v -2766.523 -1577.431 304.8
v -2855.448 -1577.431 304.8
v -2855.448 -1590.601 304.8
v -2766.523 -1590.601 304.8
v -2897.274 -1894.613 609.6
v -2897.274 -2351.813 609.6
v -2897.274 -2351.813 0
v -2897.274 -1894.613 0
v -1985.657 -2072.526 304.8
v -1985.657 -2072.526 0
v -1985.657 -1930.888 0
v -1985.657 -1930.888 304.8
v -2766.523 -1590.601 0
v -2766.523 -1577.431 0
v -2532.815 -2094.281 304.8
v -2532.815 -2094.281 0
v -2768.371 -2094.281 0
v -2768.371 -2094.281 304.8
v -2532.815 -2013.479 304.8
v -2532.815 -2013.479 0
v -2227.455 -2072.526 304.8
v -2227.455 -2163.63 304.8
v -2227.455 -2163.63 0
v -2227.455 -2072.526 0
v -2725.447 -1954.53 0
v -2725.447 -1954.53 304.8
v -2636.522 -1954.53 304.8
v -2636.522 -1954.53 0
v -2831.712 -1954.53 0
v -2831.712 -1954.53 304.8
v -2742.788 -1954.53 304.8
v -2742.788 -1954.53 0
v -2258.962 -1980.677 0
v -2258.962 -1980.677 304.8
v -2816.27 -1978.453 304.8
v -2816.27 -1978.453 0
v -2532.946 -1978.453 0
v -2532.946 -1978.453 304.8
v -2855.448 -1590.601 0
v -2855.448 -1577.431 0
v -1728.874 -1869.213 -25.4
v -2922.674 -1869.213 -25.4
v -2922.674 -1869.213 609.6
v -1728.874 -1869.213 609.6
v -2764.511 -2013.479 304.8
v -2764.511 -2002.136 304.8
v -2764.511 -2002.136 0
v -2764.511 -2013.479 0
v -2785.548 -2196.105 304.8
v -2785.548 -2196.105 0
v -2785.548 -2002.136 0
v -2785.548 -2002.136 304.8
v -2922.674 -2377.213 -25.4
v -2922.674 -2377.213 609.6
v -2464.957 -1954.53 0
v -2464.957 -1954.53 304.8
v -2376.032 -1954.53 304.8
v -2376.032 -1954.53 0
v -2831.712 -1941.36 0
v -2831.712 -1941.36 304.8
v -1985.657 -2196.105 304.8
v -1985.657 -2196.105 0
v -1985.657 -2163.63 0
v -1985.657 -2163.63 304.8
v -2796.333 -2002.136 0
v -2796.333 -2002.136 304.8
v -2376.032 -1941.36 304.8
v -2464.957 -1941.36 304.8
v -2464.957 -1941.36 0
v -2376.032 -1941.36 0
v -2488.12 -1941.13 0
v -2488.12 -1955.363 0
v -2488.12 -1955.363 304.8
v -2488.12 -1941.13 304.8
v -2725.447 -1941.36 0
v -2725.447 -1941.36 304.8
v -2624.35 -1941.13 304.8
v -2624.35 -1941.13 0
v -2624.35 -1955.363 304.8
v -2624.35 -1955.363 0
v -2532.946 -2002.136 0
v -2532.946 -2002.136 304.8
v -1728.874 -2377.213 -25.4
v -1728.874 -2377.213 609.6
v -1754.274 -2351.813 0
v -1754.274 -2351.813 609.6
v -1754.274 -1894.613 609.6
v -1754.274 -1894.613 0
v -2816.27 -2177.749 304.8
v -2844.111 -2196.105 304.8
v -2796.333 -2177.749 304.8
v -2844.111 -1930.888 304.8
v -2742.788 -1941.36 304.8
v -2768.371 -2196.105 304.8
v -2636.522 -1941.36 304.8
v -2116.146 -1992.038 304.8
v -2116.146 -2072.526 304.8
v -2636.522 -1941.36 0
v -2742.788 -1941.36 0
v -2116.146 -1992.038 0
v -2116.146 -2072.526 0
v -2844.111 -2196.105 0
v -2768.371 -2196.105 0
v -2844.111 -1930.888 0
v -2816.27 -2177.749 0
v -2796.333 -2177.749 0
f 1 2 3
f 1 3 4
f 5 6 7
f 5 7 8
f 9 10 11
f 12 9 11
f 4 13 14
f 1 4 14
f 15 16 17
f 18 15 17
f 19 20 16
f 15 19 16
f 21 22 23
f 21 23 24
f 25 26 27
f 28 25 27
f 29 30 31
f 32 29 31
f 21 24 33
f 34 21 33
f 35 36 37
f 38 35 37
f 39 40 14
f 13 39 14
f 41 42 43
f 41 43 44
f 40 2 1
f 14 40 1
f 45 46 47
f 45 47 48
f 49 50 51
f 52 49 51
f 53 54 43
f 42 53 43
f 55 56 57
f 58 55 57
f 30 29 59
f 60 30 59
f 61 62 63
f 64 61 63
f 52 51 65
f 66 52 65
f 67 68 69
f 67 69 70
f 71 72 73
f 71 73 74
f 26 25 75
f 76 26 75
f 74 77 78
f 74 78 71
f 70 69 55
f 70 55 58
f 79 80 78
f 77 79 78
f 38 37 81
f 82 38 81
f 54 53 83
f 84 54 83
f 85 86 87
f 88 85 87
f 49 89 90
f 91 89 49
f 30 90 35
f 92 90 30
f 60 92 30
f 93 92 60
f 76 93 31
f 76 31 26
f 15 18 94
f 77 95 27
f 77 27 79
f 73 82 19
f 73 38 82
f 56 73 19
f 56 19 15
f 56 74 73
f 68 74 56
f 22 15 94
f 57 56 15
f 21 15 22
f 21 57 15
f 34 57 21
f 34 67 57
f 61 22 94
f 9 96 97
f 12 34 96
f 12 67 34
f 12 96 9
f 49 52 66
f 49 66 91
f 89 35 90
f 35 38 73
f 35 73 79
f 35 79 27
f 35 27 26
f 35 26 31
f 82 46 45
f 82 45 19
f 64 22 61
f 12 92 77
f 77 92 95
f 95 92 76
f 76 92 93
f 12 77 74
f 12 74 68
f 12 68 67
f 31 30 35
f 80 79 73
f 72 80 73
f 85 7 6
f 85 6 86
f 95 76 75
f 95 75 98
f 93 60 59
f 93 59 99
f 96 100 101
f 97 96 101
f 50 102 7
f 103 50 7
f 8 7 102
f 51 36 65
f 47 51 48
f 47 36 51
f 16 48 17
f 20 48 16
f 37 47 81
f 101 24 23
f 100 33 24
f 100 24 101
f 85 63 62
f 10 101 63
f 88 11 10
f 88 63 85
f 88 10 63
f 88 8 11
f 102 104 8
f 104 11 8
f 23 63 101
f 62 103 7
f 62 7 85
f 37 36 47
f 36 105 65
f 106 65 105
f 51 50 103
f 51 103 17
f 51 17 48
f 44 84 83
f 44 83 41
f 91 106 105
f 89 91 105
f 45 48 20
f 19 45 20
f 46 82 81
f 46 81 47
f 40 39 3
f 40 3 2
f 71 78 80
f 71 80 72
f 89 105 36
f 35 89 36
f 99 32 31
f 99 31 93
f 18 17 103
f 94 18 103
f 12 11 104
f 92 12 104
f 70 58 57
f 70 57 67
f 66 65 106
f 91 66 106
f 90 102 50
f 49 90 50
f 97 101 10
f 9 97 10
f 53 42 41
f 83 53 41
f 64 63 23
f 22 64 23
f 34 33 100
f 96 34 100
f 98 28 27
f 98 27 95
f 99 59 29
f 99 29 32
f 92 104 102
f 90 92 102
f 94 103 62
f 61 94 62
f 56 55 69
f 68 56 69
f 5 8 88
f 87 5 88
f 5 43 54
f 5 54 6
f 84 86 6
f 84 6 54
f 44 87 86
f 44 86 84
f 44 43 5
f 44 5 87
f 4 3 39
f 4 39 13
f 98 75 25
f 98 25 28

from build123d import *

# Parameters (mm, degrees)
F0_W     = 1143
F0_H     = 457.2
F1_DEPTH = 609.6
F2_T     = 25.4
F3_W     = 88.9248847961
F3_H     = 13.1702423096
F3_W_2   = 136.2295150757
F3_H_2   = 14.2334699631
F4_DEPTH = 304.8


with BuildPart() as f1:
    # F0 (on Top) → F1 (new body)
    with BuildSketch(Plane.XY):
        with Locations((-2325.7739219427, -2123.2131924457)):
            Rectangle(F0_W, F0_H)
    extrude(amount=F1_DEPTH)

    # F2
    f2_openings = [f1.faces().sort_by_distance(p)[0] for p in [
        (-2325.773922, -2123.213192, 609.6),
    ]]
    offset(amount=F2_T, openings=f2_openings, kind=Kind.INTERSECTION)

    # F3 (on face) → F4 (join)
    with BuildSketch(Plane.XY):
        Polygon((-2361.9454296121, -1930.8880567551), (-2844.1109657288, -1930.8880567551), (-2844.1109657288, -2196.1047649384), (-2830.2676677704, -2196.1047649384), (-2830.2676677704, -1966.5903649384), (-2519.6123123169, -1966.5903649384), (-2519.6123123169, -2196.1047649384), (-2361.9454296121, -2196.1047649384), align=None)
        with Locations((-2787.2500419617, -1947.9447603226)):
            Rectangle(F3_W, F3_H, mode=Mode.SUBTRACT)
        with Locations((-2680.9844970703, -1947.9447603226)):
            Rectangle(F3_W, F3_H, mode=Mode.SUBTRACT)
        with Locations((-2556.2350749969, -1948.2466578484)):
            Rectangle(F3_W_2, F3_H_2, mode=Mode.SUBTRACT)
        with Locations((-2420.494556427, -1947.9447603226)):
            Rectangle(F3_W, F3_H, mode=Mode.SUBTRACT)
        Polygon((-1985.6573343277, -1930.8880567551), (-2361.9454296121, -1930.8880567551), (-2361.9454296121, -2196.1047649384), (-1985.6573343277, -2196.1047649384), (-1985.6573343277, -2163.6300086975), (-2227.4553775787, -2163.6300086975), (-2227.4553775787, -2072.5255012512), (-2258.9621543884, -1980.6768894196), (-2116.1458492279, -1992.0384883881), (-2116.1458492279, -2072.5255012512), (-1985.6573343277, -2072.5255012512), align=None)
        Polygon((-2830.2676677704, -1966.5903649384), (-2830.2676677704, -2196.1047649384), (-2785.5479717255, -2196.1047649384), (-2785.5479717255, -2002.1357536316), (-2796.3330745697, -2002.1357536316), (-2796.3330745697, -2177.7493953705), (-2816.2701129913, -2177.7493953705), (-2816.2701129913, -1978.4531593323), (-2532.9463481903, -1978.4531593323), (-2532.9463481903, -2002.1357536316), (-2764.5108699799, -2002.1357536316), (-2764.5108699799, -2013.4794712067), (-2532.8149795532, -2013.4794712067), (-2532.8149795532, -2094.2807197571), (-2768.3706283569, -2094.2807197571), (-2768.3706283569, -2196.1047649384), (-2708.4498405457, -2196.1047649384), (-2519.6123123169, -2196.1047649384), (-2519.6123123169, -1966.5903649384), align=None)
    extrude(amount=F4_DEPTH)


with BuildPart() as f4:
    # F3 (on face) → F4, piece 2 (new body)
    with BuildSketch(Plane.XY):
        with Locations((-2810.9855651855, -1584.016084671)):
            Rectangle(F3_W, F3_H)
    extrude(amount=F4_DEPTH)


solid = Compound([f1.part, f4.part])
